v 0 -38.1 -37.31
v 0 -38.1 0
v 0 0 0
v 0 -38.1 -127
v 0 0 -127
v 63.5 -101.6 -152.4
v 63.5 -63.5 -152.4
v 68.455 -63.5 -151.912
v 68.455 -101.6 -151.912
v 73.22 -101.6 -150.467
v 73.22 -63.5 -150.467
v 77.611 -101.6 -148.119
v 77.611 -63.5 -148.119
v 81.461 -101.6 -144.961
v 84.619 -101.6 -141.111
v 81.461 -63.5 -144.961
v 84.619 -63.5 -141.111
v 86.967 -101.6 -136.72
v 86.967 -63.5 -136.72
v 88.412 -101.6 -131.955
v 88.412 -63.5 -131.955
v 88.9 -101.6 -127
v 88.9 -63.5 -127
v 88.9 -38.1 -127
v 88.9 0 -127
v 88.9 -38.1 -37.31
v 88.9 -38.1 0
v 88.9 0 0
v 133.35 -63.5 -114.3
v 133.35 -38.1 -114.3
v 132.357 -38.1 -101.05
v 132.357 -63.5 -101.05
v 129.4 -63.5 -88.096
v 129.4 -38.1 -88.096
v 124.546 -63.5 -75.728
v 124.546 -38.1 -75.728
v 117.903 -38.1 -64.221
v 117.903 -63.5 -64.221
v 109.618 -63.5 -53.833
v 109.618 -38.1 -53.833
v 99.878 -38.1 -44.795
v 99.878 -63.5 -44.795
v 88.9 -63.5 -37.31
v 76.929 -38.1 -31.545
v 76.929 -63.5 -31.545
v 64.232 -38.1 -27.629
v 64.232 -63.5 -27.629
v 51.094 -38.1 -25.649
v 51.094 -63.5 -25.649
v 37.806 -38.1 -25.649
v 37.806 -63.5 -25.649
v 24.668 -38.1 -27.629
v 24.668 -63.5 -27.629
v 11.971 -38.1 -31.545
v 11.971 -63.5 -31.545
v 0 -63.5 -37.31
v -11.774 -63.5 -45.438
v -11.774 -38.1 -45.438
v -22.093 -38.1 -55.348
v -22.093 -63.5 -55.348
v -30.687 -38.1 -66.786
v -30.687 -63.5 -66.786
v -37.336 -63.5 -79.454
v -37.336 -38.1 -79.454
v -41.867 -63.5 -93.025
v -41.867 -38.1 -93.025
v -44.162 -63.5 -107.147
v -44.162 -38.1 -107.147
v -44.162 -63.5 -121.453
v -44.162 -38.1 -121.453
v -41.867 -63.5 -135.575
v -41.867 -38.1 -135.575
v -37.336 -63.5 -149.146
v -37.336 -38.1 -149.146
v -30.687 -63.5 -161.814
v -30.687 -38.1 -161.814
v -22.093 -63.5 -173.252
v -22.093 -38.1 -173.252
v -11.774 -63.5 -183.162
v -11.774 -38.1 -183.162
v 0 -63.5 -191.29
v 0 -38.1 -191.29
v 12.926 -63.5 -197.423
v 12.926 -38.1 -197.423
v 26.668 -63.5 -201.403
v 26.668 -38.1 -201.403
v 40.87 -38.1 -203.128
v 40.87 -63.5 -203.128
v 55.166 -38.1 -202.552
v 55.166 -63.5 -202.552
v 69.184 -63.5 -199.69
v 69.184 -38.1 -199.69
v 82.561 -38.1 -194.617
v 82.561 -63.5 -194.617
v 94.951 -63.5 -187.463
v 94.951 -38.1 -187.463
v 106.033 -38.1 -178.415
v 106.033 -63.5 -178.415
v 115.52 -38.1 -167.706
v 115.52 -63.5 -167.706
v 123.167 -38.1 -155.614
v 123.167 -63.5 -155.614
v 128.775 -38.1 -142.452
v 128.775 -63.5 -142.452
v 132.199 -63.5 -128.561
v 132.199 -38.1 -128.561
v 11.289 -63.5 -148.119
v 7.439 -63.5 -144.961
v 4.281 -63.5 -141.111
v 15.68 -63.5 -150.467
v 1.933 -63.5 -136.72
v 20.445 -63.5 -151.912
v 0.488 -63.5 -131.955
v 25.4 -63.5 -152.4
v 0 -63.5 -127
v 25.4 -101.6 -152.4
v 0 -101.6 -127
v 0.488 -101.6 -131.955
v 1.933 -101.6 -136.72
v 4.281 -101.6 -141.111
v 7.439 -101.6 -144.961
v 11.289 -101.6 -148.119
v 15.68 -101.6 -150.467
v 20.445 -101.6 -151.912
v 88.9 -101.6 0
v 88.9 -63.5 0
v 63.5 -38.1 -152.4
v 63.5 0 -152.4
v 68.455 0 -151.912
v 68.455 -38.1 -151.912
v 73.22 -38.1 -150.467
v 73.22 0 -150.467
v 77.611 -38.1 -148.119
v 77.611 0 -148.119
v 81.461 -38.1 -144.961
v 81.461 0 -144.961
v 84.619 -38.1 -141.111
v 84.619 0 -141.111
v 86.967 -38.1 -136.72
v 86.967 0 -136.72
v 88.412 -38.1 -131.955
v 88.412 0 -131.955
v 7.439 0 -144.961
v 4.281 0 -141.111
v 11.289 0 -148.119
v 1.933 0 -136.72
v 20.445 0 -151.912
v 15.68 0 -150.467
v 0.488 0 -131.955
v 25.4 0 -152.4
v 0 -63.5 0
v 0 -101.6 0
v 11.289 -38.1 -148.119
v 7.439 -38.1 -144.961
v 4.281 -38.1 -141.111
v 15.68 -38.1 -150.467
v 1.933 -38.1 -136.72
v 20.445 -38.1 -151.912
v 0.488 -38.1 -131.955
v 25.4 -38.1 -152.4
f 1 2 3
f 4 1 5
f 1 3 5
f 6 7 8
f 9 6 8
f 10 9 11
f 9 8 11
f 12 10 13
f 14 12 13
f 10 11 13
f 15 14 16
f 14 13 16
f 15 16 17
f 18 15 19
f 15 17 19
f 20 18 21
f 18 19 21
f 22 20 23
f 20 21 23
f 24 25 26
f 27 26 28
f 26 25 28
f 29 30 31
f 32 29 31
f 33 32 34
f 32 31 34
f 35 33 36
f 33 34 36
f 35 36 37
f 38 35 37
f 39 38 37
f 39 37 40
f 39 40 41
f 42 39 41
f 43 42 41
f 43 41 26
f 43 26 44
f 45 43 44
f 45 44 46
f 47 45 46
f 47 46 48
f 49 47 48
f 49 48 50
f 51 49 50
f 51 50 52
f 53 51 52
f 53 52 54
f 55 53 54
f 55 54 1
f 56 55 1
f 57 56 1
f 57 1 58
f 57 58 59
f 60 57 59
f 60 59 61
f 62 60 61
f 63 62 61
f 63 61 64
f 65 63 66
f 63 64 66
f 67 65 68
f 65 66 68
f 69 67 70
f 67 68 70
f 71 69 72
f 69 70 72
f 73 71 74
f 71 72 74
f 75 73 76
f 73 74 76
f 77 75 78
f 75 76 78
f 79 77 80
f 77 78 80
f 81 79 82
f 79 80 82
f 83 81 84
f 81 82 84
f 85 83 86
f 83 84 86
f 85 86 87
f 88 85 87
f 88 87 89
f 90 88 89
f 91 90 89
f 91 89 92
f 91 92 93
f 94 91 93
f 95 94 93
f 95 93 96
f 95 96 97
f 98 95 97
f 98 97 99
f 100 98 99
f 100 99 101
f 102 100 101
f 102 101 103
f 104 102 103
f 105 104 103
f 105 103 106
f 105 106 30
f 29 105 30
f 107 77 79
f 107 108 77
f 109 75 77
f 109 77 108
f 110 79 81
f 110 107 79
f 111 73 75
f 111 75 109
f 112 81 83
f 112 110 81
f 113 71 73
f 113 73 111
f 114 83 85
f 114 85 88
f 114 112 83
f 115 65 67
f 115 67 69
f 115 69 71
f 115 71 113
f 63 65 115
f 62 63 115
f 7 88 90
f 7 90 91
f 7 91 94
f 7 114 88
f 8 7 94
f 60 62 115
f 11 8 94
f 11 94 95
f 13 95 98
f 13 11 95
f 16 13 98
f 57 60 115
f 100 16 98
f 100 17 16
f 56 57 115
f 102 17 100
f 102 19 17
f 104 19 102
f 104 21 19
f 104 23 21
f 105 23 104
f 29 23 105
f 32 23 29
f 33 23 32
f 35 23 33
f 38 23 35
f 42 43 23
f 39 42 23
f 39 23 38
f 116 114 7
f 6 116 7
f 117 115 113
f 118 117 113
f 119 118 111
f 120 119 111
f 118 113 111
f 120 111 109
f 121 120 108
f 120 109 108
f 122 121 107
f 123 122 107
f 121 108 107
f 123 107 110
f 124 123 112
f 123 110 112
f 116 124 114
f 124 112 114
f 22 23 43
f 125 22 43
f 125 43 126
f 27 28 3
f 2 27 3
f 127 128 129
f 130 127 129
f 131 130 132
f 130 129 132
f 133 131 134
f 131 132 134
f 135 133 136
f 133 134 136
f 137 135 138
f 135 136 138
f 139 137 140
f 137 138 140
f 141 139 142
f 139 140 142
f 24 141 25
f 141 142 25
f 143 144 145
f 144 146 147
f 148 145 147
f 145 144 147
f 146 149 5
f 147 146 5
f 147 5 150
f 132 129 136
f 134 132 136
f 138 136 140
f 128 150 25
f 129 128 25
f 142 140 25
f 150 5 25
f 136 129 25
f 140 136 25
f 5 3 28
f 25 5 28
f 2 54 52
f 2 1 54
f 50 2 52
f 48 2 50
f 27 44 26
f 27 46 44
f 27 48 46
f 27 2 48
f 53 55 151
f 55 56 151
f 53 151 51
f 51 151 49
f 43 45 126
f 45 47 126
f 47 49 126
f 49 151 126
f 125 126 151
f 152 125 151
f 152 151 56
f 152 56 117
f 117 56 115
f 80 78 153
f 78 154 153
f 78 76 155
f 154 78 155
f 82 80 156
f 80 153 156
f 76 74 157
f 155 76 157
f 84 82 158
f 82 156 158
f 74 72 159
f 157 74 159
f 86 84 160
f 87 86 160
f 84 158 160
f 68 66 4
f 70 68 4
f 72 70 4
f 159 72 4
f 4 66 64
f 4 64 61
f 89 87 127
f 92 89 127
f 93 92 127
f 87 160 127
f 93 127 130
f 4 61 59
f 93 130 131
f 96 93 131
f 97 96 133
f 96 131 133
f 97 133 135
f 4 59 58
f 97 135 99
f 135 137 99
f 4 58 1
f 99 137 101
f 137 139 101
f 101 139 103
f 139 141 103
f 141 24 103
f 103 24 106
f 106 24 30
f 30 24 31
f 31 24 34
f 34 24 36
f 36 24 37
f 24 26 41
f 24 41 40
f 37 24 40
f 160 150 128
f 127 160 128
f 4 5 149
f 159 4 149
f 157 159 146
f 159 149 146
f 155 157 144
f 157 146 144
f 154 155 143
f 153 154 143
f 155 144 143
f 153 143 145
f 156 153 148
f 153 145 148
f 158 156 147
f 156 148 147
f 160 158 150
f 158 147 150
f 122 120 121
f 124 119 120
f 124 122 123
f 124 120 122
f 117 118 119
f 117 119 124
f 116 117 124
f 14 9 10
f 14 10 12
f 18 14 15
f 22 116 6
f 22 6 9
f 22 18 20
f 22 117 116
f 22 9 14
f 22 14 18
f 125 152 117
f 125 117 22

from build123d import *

# Parameters (mm, degrees)
F1_DEPTH = 38.1
F2_R     = 88.9
F3_DEPTH = 25.4
F5_DEPTH = 38.1


with BuildPart() as f1:
    # F0 (on Front) → F1 (new body)
    with BuildSketch(Plane.XZ):
        with BuildLine():
            Line((88.9, 0), (0, 0))
            Line((0, 0), (0, -127))
            ThreePointArc((0, -127), (7.4394877579, -144.9605122421), (25.4, -152.4))
            Line((25.4, -152.4), (63.5, -152.4))
            ThreePointArc((63.5, -152.4), (81.4605122421, -144.9605122421), (88.9, -127))
            Line((88.9, -127), (88.9, 0))
        make_face()
    extrude(amount=F1_DEPTH)

    # F2 (on face) → F3 (join)
    with BuildSketch(Plane.XZ.offset(38.1)):
        with Locations((44.45, -114.3)):
            Circle(F2_R)
    extrude(amount=F3_DEPTH)

    # F4 (on face) → F5 (join)
    with BuildSketch(Plane.XZ.offset(63.5)):
        with BuildLine():
            Line((88.9, 0), (0, 0))
            Line((0, 0), (0, -127))
            ThreePointArc((0, -127), (7.4394877579, -144.9605122421), (25.4, -152.4))
            Line((25.4, -152.4), (63.5, -152.4))
            ThreePointArc((63.5, -152.4), (81.4605122421, -144.9605122421), (88.9, -127))
            Line((88.9, -127), (88.9, 0))
        make_face()
    extrude(amount=F5_DEPTH)


solid = f1.part
